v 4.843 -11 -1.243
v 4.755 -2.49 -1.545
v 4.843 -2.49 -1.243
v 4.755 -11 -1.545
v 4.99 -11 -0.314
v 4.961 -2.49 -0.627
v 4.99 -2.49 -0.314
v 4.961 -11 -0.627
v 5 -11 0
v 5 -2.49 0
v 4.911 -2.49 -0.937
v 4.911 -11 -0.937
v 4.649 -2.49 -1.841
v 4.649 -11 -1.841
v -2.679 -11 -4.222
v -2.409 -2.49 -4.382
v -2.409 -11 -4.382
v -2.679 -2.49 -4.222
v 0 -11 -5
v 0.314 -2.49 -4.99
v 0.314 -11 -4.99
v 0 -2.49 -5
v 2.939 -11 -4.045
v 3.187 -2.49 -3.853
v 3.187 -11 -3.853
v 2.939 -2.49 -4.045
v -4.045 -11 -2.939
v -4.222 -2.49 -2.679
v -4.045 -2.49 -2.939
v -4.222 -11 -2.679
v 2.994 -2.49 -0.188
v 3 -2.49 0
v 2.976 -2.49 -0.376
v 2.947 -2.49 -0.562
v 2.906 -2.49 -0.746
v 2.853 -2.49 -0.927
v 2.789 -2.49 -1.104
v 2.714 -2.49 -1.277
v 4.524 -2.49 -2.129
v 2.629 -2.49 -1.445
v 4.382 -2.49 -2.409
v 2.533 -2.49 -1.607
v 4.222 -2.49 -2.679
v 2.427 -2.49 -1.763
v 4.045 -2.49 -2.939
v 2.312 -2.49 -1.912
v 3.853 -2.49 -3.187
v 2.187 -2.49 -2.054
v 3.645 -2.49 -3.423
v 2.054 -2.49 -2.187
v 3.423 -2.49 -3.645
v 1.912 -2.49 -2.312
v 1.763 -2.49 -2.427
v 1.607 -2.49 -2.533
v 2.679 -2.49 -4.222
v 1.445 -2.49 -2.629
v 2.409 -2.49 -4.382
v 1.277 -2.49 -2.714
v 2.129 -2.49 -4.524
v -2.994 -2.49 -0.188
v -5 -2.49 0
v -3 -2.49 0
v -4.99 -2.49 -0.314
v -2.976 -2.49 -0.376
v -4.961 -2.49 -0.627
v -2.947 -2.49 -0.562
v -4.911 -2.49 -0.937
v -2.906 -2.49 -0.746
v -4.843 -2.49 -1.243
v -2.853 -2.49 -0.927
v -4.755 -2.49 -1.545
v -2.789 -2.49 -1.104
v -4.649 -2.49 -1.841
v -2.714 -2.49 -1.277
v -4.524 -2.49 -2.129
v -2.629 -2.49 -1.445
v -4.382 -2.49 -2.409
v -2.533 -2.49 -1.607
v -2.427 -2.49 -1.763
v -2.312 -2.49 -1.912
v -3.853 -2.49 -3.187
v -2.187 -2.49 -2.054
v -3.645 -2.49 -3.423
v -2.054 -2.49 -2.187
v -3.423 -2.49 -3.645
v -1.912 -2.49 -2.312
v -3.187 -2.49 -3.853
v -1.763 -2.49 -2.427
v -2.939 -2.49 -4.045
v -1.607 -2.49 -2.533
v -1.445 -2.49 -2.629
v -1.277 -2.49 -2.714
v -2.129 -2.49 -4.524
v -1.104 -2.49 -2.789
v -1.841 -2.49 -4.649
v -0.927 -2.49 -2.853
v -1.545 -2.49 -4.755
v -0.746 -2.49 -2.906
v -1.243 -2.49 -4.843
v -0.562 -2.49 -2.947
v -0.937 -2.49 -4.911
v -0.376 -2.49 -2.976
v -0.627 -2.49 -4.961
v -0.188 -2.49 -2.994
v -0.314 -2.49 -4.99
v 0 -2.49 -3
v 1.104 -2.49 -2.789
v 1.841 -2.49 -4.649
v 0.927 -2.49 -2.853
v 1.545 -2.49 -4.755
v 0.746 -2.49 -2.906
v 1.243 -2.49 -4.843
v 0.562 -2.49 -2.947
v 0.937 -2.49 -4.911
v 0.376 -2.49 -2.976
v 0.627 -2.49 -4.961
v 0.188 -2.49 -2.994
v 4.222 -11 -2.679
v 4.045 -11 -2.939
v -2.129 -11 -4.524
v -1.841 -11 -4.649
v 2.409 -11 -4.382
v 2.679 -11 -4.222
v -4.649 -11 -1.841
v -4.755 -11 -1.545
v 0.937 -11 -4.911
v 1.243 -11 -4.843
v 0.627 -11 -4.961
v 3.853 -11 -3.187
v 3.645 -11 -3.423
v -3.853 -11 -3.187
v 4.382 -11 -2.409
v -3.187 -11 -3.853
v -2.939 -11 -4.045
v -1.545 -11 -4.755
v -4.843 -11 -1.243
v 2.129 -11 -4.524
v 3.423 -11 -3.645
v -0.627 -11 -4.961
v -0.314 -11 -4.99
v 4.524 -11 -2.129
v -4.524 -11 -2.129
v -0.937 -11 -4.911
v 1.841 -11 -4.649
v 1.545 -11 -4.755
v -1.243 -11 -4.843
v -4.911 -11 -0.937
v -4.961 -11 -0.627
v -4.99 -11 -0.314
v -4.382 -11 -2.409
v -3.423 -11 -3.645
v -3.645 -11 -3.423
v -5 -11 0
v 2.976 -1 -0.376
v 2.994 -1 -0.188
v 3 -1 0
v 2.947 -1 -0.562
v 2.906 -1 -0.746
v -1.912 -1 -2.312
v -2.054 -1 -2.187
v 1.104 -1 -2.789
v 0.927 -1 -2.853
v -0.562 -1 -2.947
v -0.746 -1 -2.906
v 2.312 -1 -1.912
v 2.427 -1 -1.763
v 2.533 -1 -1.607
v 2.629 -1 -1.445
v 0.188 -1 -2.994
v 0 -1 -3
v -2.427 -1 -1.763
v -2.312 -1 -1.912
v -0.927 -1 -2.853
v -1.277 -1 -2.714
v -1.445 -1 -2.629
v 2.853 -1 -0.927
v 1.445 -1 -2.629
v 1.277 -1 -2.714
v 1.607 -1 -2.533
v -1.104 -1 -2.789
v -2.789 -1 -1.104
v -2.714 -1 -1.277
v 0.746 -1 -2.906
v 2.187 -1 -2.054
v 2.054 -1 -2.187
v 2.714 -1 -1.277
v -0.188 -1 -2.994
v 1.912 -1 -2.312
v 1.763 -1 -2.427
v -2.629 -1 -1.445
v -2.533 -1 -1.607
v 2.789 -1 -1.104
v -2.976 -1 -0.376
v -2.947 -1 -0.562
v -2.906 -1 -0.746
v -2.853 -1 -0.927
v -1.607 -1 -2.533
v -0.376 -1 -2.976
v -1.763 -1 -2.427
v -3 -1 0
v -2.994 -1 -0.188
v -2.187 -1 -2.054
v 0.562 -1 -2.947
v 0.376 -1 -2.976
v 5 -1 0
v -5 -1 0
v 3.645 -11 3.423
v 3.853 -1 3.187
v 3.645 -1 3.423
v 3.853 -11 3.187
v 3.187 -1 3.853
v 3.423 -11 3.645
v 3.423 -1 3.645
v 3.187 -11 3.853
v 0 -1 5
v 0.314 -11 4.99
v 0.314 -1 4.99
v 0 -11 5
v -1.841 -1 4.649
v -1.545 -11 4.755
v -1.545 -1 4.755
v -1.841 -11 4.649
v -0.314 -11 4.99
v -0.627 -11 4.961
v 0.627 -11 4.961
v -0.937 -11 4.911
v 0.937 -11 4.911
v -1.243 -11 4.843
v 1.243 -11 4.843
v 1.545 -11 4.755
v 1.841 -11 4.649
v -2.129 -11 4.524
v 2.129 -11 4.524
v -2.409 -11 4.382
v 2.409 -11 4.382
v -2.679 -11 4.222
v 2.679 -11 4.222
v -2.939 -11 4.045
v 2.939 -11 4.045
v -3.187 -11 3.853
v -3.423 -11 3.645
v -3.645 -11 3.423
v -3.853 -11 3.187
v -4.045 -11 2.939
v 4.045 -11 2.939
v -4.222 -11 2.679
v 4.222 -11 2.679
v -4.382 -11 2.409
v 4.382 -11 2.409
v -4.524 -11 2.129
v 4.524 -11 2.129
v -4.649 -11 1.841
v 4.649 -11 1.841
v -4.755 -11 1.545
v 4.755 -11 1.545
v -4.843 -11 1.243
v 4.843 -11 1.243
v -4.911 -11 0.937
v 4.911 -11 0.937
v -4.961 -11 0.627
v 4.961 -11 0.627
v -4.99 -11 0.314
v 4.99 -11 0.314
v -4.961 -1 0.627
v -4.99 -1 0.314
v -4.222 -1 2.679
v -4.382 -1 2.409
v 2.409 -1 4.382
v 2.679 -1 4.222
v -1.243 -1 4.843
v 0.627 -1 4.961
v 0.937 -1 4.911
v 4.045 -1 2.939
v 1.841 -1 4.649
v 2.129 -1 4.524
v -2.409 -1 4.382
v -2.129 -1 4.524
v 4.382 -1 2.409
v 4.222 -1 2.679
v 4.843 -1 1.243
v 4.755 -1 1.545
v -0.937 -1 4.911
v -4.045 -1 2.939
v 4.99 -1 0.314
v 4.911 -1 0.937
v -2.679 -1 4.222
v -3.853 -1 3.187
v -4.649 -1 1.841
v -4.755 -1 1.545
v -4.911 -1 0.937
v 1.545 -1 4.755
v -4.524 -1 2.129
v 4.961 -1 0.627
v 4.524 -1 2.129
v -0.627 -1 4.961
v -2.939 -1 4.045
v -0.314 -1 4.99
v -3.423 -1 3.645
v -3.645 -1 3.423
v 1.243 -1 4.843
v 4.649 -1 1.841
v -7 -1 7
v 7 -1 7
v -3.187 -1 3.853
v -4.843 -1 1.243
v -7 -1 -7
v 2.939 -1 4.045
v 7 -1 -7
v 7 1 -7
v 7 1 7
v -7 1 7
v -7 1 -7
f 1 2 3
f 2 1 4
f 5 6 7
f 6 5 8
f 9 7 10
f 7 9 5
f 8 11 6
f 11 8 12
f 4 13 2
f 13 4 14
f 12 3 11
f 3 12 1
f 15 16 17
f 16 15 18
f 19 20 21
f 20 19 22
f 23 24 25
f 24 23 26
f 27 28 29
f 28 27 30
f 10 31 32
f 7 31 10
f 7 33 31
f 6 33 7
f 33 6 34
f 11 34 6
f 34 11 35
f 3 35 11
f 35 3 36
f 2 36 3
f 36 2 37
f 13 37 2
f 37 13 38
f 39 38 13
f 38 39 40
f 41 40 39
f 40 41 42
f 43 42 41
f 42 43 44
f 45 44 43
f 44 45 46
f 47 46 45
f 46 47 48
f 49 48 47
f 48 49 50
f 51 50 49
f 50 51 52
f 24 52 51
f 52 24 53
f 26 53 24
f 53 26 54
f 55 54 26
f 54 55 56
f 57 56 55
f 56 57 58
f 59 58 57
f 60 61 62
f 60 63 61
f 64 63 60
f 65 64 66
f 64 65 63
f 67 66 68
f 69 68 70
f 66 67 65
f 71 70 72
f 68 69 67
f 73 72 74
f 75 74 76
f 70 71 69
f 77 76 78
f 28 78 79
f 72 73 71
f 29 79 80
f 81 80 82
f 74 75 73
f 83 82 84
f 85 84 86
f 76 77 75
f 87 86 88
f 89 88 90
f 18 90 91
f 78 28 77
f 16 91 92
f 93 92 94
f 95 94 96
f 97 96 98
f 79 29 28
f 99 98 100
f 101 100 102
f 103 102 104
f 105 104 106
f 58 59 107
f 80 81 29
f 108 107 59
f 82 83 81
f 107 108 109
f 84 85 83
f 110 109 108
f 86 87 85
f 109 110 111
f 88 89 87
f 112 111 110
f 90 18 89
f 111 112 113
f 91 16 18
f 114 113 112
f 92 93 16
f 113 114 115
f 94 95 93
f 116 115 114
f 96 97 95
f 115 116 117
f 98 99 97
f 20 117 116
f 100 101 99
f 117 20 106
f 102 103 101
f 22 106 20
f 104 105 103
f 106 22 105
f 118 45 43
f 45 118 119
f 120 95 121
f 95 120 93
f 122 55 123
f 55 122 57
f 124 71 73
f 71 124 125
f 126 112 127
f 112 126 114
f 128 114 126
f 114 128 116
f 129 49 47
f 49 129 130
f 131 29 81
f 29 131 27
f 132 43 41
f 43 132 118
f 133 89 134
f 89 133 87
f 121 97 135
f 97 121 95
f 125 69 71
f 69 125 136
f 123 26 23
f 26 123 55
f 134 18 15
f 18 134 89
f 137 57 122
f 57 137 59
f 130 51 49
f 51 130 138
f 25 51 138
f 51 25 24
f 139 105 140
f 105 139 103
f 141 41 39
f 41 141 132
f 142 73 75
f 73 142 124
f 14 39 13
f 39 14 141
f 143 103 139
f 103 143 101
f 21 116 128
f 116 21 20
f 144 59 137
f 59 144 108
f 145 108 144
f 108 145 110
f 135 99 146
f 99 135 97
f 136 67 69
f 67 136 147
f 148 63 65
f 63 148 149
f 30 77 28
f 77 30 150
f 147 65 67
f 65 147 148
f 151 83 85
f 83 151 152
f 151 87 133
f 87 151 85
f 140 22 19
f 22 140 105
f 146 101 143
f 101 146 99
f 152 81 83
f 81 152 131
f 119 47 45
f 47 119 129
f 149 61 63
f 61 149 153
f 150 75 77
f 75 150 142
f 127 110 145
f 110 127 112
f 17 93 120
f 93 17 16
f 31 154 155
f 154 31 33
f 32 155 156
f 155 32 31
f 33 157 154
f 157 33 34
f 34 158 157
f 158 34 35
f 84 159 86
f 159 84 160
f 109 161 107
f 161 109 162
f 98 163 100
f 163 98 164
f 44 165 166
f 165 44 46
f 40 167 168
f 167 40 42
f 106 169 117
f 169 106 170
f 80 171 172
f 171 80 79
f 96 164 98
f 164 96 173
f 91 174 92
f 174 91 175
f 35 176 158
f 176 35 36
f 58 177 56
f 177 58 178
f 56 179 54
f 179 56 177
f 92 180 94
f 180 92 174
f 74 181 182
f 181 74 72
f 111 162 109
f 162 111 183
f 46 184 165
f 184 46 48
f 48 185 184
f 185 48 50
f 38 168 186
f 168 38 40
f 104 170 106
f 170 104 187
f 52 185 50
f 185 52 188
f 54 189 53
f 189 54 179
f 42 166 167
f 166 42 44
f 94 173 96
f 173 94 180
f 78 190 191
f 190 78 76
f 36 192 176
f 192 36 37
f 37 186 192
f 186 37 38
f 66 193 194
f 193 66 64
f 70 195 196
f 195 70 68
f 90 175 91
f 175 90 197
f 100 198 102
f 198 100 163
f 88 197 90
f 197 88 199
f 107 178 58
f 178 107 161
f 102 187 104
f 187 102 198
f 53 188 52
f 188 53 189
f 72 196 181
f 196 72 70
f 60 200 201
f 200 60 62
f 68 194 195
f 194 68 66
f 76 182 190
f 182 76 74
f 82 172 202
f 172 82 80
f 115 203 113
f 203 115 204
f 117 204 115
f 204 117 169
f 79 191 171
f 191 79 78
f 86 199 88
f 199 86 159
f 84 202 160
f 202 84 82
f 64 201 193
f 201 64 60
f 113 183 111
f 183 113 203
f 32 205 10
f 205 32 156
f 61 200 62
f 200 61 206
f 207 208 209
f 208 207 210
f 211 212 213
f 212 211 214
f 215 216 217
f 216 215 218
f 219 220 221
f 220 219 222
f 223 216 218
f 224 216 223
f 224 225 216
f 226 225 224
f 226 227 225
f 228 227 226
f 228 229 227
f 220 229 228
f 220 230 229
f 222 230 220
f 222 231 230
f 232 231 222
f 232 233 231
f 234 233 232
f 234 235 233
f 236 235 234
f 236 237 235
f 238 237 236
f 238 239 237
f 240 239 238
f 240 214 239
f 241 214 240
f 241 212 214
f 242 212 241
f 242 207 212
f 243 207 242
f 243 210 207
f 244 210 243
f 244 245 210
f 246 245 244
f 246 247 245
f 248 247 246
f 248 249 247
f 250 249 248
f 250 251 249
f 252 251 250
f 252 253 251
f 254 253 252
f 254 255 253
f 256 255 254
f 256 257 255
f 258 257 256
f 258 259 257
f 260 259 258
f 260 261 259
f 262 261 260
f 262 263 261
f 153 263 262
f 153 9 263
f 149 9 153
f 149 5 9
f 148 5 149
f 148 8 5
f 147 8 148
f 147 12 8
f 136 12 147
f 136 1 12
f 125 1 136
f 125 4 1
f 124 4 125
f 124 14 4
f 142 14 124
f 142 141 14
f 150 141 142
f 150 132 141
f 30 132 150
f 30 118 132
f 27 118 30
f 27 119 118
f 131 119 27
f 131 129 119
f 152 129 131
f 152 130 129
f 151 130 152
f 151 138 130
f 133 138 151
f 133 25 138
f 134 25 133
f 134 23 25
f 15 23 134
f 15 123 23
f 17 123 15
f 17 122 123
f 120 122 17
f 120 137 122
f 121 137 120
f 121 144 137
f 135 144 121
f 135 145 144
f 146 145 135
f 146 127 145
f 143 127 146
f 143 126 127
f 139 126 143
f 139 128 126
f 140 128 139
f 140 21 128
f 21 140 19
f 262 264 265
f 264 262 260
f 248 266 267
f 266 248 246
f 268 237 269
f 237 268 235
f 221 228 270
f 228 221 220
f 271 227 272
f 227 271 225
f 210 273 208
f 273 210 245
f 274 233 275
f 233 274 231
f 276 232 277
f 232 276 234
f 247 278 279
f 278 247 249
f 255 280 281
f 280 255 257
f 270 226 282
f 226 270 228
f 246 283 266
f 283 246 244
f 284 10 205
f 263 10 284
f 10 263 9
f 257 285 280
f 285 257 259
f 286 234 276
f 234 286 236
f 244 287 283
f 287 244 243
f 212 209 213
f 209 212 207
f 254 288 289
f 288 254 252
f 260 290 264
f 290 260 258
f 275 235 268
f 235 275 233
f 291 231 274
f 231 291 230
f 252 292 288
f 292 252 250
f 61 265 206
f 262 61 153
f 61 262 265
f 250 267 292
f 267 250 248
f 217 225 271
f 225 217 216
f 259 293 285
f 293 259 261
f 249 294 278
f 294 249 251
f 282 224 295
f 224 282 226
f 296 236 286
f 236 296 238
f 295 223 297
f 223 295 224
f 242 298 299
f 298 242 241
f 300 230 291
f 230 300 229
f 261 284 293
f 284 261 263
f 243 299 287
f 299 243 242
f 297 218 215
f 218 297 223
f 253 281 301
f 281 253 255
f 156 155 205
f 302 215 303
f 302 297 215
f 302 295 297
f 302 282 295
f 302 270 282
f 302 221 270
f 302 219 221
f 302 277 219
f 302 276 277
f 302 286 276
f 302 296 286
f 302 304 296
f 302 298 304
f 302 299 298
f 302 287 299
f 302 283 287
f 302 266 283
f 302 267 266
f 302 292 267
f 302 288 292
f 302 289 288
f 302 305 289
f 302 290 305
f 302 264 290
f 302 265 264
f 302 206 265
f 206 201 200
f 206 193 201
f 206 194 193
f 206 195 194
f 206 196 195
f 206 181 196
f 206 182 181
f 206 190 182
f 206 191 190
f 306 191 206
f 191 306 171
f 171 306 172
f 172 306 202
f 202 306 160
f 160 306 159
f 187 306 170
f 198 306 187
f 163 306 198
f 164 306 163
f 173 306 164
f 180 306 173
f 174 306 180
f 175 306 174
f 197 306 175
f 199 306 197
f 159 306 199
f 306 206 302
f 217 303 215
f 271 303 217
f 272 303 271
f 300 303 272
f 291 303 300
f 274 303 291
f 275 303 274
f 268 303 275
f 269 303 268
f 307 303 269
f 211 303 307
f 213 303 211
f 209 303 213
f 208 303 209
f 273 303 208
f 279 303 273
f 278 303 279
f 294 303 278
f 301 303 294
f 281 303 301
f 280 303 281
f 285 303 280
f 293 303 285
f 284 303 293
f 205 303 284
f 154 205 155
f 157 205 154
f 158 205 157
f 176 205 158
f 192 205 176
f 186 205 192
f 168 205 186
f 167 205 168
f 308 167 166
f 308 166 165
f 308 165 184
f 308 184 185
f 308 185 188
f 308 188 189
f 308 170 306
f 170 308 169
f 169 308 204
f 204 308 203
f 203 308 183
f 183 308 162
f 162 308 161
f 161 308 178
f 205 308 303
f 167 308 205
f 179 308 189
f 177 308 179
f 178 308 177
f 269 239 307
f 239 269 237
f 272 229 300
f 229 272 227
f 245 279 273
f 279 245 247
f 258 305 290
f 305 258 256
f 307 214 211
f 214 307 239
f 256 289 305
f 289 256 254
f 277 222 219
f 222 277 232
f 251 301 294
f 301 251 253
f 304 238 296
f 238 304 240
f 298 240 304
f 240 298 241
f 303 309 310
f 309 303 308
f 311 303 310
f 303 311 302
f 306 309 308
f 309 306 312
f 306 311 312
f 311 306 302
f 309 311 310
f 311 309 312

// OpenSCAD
// file: functions.scad
module accessoryBaseWithPins(baseWidth, baseHeight, baseThickness) {
    $fn = 100;
    
    // Pin Parameters
    pinDiameter=10;
    pinHeight = 10;
    pinSpacingX = 22;
    pinSpacingY = 34;
    cutoutThickness = 1.5;

    // Calculate number of pins
    numPinsX = max(1, floor(baseWidth / pinSpacingX));
    numPinsY = max(1, floor(baseHeight / pinSpacingY));

    // Total span of pins
    totalSpanX = (numPinsX - 1) * pinSpacingX;
    totalSpanY = (numPinsY - 1) * pinSpacingY;

    difference() {
        // Pins centered on top face
        rotate([90,0,0])
        for (i = [0 : numPinsX - 1])
            for (j = [0 : numPinsY - 1]) {
                xOffset = -totalSpanX/2 + i * pinSpacingX;
                zOffset = -totalSpanY/2 + j * pinSpacingY;
                translate([xOffset, zOffset, pinHeight/2 + baseThickness/2])
                    difference(){
                        rotate([0,180,180])
                        color("orange")
                        pin(pinDiameter, pinHeight, cutoutThickness);
                    }
            }
    }

    // Base
    cube([baseWidth, baseThickness, baseHeight], center = true);
}

module pin(pinDiameter = 10, pinHeight = 10, cutoutThickness = 1.5){
    $fn = 100;
    $innerD = 6;
    
    difference(){
        cylinder(h = pinHeight, r = pinDiameter / 2, center = true);

        translate([0,0,pinHeight/2-cutoutThickness/2+0.01])
        difference() {
            // Full washer
            cylinder(h=cutoutThickness, r=pinDiameter/2, center=true);
                
            // slightly taller to ensure clean subtraction
            cylinder(h=cutoutThickness, r=$innerD/2, center=true);

            // Cut it in half
            translate([-pinDiameter/2, -pinDiameter/2, -cutoutThickness])
            cube([pinDiameter, pinDiameter/2, cutoutThickness*2]);
        }
    }
}


// The Width of the accessory base
$accessoryBaseWidth = 44; // [14:250]

// The Height of the accessory base
$accessoryBaseHeight = 68; // [14:220]

// Thickness of the accessory base
$accessoryBaseThickness = 2; // {0:5]

accessoryBaseWithPins($accessoryBaseWidth, $accessoryBaseHeight, $accessoryBaseThickness);
// main file
include <functions.scad>

// The Width of the accessory base
$accessoryBaseWidth = 14; // [14:250]

// The Height of the accessory base
$accessoryBaseHeight = 14; // [14:220]

// Thickness of the accessory base
$accessoryBaseThickness = 2; // [0:5]

accessoryBaseWithPins($accessoryBaseWidth, $accessoryBaseHeight, $accessoryBaseThickness);
